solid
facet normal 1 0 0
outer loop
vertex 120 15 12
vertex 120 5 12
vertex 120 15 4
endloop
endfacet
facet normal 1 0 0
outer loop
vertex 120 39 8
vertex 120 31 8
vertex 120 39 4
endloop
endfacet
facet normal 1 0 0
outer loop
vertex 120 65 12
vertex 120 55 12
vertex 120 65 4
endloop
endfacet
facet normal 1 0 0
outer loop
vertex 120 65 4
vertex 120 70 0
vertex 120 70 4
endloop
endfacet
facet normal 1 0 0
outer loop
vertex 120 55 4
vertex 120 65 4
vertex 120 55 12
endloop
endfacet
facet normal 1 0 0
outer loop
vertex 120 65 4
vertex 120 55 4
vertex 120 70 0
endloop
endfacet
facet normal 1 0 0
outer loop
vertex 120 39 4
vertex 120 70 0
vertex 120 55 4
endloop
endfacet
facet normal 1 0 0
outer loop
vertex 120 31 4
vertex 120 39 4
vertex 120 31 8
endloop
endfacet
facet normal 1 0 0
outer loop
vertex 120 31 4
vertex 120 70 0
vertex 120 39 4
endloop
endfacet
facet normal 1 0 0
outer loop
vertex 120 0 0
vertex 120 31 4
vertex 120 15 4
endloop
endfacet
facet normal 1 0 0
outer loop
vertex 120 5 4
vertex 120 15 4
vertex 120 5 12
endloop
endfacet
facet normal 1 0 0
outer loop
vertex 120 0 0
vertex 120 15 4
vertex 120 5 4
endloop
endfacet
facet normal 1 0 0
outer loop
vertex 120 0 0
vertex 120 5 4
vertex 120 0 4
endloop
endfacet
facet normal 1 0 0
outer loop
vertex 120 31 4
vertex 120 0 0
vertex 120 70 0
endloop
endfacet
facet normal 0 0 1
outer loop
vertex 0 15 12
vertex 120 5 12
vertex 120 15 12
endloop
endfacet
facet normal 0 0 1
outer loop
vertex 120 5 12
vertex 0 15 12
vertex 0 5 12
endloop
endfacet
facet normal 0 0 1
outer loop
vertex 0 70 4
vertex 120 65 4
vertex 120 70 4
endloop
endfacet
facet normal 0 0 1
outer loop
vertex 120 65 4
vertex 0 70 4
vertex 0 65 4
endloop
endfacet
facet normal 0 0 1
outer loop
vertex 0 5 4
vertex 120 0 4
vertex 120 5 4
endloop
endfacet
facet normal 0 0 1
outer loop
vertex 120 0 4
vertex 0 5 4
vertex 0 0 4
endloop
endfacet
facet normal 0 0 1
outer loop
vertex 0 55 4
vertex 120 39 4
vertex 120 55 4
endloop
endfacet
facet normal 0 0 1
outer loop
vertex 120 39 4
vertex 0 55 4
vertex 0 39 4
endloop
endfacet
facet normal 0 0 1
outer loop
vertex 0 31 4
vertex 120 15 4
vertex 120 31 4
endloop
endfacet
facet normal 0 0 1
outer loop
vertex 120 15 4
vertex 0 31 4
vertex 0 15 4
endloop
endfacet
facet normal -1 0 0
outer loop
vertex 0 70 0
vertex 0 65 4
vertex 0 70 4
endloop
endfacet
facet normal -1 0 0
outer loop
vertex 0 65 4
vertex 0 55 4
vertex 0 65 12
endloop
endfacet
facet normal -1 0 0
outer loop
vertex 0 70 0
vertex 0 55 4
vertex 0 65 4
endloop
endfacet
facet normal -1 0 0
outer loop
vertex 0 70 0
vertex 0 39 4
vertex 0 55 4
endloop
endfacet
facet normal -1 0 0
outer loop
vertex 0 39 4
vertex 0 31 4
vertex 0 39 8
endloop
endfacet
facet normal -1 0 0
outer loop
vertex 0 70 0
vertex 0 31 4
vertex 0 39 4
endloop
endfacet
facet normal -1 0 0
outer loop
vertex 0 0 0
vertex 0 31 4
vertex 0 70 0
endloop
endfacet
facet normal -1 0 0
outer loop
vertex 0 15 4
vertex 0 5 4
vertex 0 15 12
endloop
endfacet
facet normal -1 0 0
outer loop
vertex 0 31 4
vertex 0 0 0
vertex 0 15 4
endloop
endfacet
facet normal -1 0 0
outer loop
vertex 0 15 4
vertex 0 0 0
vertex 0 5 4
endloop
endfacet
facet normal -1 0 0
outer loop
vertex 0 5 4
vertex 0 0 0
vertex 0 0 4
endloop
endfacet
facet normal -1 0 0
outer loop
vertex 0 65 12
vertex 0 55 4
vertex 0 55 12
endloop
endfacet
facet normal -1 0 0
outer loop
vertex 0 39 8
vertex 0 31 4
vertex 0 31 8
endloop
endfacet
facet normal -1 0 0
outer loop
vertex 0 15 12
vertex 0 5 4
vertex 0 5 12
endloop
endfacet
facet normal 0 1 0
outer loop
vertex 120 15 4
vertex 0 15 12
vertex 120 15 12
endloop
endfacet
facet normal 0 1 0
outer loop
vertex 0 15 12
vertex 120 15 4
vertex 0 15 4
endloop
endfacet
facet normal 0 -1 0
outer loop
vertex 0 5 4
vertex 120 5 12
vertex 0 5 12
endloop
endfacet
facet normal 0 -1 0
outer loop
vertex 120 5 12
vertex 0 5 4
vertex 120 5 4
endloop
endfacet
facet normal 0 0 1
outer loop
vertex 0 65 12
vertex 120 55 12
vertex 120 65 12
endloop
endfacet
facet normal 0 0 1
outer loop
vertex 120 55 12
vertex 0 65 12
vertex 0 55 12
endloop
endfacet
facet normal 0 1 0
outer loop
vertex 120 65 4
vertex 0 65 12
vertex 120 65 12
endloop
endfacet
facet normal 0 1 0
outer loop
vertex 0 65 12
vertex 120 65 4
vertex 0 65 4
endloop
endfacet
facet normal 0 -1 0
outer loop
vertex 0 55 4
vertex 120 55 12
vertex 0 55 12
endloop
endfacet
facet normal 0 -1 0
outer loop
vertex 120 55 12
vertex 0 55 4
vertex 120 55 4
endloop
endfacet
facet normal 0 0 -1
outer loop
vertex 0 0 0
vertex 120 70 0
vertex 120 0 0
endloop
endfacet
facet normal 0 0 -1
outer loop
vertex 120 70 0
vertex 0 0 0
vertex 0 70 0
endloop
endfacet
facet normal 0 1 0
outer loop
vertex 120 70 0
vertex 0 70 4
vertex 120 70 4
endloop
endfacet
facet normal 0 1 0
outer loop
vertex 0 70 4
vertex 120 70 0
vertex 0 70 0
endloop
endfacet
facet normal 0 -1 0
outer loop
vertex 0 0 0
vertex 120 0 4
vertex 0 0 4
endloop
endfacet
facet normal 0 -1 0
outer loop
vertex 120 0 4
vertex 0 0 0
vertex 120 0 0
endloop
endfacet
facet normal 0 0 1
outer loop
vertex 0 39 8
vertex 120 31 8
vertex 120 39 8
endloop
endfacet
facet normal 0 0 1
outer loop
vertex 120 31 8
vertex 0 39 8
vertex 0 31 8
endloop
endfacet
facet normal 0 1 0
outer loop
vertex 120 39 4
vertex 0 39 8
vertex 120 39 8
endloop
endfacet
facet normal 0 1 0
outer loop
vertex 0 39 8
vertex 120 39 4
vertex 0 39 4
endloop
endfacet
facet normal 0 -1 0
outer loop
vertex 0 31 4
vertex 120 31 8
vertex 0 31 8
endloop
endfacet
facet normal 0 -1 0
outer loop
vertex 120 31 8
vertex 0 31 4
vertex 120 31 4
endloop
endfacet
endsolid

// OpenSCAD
// file: _common.scad
// Parametros comunes del mini heliostato.

$fn = 96;

eps = 0.02;

bearing_608_od = 22;
bearing_608_id = 8;
bearing_608_width = 7;

shaft_d = 8;
shaft_clearance = 0.2;

m3_clearance = 3.3;
m4_clearance = 4.3;

gt2_pitch = 2;
gt2_belt_width = 6;

module rounded_box(size = [10, 10, 10], r = 2) {
    hull() {
        for (x = [r, size[0] - r])
        for (y = [r, size[1] - r])
        for (z = [r, size[2] - r])
            translate([x, y, z]) sphere(r = r, $fn = 24);
    }
}

module screw_hole_x(d = m3_clearance, length = 20) {
    rotate([0, 90, 0])
        cylinder(d = d, h = length, center = true, $fn = 48);
}

module screw_hole_y(d = m3_clearance, length = 20) {
    rotate([90, 0, 0])
        cylinder(d = d, h = length, center = true, $fn = 48);
}

module shaft_hole_x(d = shaft_d + shaft_clearance, length = 40) {
    rotate([0, 90, 0])
        cylinder(d = d, h = length, center = true, $fn = 96);
}
// main file
include <_common.scad>

// Cambiar a "rail" o "carriage" y exportar cada pieza por separado.
part = "rail";

rail_len = 120;
rail_w = 70;
rail_base_h = 4;
guide_w = 10;
guide_h = 8;
guide_spacing = 50;

carriage_len = 70;
carriage_w = 70;
carriage_h = 14;
clearance = 0.45;
lock_screw_d = m4_clearance;

module rail_profile(len = rail_len) {
    union() {
        cube([len, rail_w, rail_base_h]);

        for (y = [rail_w / 2 - guide_spacing / 2, rail_w / 2 + guide_spacing / 2]) {
            translate([0, y - guide_w / 2, rail_base_h])
                cube([len, guide_w, guide_h]);
        }

        // Nervadura central baja.
        translate([0, rail_w / 2 - 4, rail_base_h])
            cube([len, 8, 4]);
    }
}

module carriage() {
    difference() {
        cube([carriage_len, carriage_w, carriage_h]);

        // Canal inferior para que el carro abrace las dos guias.
        for (y = [carriage_w / 2 - guide_spacing / 2, carriage_w / 2 + guide_spacing / 2]) {
            translate([-eps, y - guide_w / 2 - clearance, -eps])
                cube([
                    carriage_len + 2 * eps,
                    guide_w + 2 * clearance,
                    guide_h + rail_base_h + clearance
                ]);
        }

        // Rebaje central para reducir friccion contra la base del riel.
        translate([-eps, carriage_w / 2 - 11, -eps])
            cube([carriage_len + 2 * eps, 22, rail_base_h + clearance]);

        // Tornillo de bloqueo lateral M4.
        translate([carriage_len / 2, carriage_w / 2 + guide_spacing / 2, rail_base_h + guide_h / 2])
            rotate([90, 0, 0])
                cylinder(d = lock_screw_d, h = 24, center = true, $fn = 48);

        // Perforaciones para montar pantalla o soporte.
        for (x = [carriage_len / 2 - 15, carriage_len / 2 + 15]) {
            translate([x, carriage_w / 2, carriage_h - 6])
                cylinder(d = m3_clearance, h = 8, $fn = 48);
        }
    }
}

if (part == "rail") {
    rail_profile();
} else if (part == "carriage") {
    carriage();
}
